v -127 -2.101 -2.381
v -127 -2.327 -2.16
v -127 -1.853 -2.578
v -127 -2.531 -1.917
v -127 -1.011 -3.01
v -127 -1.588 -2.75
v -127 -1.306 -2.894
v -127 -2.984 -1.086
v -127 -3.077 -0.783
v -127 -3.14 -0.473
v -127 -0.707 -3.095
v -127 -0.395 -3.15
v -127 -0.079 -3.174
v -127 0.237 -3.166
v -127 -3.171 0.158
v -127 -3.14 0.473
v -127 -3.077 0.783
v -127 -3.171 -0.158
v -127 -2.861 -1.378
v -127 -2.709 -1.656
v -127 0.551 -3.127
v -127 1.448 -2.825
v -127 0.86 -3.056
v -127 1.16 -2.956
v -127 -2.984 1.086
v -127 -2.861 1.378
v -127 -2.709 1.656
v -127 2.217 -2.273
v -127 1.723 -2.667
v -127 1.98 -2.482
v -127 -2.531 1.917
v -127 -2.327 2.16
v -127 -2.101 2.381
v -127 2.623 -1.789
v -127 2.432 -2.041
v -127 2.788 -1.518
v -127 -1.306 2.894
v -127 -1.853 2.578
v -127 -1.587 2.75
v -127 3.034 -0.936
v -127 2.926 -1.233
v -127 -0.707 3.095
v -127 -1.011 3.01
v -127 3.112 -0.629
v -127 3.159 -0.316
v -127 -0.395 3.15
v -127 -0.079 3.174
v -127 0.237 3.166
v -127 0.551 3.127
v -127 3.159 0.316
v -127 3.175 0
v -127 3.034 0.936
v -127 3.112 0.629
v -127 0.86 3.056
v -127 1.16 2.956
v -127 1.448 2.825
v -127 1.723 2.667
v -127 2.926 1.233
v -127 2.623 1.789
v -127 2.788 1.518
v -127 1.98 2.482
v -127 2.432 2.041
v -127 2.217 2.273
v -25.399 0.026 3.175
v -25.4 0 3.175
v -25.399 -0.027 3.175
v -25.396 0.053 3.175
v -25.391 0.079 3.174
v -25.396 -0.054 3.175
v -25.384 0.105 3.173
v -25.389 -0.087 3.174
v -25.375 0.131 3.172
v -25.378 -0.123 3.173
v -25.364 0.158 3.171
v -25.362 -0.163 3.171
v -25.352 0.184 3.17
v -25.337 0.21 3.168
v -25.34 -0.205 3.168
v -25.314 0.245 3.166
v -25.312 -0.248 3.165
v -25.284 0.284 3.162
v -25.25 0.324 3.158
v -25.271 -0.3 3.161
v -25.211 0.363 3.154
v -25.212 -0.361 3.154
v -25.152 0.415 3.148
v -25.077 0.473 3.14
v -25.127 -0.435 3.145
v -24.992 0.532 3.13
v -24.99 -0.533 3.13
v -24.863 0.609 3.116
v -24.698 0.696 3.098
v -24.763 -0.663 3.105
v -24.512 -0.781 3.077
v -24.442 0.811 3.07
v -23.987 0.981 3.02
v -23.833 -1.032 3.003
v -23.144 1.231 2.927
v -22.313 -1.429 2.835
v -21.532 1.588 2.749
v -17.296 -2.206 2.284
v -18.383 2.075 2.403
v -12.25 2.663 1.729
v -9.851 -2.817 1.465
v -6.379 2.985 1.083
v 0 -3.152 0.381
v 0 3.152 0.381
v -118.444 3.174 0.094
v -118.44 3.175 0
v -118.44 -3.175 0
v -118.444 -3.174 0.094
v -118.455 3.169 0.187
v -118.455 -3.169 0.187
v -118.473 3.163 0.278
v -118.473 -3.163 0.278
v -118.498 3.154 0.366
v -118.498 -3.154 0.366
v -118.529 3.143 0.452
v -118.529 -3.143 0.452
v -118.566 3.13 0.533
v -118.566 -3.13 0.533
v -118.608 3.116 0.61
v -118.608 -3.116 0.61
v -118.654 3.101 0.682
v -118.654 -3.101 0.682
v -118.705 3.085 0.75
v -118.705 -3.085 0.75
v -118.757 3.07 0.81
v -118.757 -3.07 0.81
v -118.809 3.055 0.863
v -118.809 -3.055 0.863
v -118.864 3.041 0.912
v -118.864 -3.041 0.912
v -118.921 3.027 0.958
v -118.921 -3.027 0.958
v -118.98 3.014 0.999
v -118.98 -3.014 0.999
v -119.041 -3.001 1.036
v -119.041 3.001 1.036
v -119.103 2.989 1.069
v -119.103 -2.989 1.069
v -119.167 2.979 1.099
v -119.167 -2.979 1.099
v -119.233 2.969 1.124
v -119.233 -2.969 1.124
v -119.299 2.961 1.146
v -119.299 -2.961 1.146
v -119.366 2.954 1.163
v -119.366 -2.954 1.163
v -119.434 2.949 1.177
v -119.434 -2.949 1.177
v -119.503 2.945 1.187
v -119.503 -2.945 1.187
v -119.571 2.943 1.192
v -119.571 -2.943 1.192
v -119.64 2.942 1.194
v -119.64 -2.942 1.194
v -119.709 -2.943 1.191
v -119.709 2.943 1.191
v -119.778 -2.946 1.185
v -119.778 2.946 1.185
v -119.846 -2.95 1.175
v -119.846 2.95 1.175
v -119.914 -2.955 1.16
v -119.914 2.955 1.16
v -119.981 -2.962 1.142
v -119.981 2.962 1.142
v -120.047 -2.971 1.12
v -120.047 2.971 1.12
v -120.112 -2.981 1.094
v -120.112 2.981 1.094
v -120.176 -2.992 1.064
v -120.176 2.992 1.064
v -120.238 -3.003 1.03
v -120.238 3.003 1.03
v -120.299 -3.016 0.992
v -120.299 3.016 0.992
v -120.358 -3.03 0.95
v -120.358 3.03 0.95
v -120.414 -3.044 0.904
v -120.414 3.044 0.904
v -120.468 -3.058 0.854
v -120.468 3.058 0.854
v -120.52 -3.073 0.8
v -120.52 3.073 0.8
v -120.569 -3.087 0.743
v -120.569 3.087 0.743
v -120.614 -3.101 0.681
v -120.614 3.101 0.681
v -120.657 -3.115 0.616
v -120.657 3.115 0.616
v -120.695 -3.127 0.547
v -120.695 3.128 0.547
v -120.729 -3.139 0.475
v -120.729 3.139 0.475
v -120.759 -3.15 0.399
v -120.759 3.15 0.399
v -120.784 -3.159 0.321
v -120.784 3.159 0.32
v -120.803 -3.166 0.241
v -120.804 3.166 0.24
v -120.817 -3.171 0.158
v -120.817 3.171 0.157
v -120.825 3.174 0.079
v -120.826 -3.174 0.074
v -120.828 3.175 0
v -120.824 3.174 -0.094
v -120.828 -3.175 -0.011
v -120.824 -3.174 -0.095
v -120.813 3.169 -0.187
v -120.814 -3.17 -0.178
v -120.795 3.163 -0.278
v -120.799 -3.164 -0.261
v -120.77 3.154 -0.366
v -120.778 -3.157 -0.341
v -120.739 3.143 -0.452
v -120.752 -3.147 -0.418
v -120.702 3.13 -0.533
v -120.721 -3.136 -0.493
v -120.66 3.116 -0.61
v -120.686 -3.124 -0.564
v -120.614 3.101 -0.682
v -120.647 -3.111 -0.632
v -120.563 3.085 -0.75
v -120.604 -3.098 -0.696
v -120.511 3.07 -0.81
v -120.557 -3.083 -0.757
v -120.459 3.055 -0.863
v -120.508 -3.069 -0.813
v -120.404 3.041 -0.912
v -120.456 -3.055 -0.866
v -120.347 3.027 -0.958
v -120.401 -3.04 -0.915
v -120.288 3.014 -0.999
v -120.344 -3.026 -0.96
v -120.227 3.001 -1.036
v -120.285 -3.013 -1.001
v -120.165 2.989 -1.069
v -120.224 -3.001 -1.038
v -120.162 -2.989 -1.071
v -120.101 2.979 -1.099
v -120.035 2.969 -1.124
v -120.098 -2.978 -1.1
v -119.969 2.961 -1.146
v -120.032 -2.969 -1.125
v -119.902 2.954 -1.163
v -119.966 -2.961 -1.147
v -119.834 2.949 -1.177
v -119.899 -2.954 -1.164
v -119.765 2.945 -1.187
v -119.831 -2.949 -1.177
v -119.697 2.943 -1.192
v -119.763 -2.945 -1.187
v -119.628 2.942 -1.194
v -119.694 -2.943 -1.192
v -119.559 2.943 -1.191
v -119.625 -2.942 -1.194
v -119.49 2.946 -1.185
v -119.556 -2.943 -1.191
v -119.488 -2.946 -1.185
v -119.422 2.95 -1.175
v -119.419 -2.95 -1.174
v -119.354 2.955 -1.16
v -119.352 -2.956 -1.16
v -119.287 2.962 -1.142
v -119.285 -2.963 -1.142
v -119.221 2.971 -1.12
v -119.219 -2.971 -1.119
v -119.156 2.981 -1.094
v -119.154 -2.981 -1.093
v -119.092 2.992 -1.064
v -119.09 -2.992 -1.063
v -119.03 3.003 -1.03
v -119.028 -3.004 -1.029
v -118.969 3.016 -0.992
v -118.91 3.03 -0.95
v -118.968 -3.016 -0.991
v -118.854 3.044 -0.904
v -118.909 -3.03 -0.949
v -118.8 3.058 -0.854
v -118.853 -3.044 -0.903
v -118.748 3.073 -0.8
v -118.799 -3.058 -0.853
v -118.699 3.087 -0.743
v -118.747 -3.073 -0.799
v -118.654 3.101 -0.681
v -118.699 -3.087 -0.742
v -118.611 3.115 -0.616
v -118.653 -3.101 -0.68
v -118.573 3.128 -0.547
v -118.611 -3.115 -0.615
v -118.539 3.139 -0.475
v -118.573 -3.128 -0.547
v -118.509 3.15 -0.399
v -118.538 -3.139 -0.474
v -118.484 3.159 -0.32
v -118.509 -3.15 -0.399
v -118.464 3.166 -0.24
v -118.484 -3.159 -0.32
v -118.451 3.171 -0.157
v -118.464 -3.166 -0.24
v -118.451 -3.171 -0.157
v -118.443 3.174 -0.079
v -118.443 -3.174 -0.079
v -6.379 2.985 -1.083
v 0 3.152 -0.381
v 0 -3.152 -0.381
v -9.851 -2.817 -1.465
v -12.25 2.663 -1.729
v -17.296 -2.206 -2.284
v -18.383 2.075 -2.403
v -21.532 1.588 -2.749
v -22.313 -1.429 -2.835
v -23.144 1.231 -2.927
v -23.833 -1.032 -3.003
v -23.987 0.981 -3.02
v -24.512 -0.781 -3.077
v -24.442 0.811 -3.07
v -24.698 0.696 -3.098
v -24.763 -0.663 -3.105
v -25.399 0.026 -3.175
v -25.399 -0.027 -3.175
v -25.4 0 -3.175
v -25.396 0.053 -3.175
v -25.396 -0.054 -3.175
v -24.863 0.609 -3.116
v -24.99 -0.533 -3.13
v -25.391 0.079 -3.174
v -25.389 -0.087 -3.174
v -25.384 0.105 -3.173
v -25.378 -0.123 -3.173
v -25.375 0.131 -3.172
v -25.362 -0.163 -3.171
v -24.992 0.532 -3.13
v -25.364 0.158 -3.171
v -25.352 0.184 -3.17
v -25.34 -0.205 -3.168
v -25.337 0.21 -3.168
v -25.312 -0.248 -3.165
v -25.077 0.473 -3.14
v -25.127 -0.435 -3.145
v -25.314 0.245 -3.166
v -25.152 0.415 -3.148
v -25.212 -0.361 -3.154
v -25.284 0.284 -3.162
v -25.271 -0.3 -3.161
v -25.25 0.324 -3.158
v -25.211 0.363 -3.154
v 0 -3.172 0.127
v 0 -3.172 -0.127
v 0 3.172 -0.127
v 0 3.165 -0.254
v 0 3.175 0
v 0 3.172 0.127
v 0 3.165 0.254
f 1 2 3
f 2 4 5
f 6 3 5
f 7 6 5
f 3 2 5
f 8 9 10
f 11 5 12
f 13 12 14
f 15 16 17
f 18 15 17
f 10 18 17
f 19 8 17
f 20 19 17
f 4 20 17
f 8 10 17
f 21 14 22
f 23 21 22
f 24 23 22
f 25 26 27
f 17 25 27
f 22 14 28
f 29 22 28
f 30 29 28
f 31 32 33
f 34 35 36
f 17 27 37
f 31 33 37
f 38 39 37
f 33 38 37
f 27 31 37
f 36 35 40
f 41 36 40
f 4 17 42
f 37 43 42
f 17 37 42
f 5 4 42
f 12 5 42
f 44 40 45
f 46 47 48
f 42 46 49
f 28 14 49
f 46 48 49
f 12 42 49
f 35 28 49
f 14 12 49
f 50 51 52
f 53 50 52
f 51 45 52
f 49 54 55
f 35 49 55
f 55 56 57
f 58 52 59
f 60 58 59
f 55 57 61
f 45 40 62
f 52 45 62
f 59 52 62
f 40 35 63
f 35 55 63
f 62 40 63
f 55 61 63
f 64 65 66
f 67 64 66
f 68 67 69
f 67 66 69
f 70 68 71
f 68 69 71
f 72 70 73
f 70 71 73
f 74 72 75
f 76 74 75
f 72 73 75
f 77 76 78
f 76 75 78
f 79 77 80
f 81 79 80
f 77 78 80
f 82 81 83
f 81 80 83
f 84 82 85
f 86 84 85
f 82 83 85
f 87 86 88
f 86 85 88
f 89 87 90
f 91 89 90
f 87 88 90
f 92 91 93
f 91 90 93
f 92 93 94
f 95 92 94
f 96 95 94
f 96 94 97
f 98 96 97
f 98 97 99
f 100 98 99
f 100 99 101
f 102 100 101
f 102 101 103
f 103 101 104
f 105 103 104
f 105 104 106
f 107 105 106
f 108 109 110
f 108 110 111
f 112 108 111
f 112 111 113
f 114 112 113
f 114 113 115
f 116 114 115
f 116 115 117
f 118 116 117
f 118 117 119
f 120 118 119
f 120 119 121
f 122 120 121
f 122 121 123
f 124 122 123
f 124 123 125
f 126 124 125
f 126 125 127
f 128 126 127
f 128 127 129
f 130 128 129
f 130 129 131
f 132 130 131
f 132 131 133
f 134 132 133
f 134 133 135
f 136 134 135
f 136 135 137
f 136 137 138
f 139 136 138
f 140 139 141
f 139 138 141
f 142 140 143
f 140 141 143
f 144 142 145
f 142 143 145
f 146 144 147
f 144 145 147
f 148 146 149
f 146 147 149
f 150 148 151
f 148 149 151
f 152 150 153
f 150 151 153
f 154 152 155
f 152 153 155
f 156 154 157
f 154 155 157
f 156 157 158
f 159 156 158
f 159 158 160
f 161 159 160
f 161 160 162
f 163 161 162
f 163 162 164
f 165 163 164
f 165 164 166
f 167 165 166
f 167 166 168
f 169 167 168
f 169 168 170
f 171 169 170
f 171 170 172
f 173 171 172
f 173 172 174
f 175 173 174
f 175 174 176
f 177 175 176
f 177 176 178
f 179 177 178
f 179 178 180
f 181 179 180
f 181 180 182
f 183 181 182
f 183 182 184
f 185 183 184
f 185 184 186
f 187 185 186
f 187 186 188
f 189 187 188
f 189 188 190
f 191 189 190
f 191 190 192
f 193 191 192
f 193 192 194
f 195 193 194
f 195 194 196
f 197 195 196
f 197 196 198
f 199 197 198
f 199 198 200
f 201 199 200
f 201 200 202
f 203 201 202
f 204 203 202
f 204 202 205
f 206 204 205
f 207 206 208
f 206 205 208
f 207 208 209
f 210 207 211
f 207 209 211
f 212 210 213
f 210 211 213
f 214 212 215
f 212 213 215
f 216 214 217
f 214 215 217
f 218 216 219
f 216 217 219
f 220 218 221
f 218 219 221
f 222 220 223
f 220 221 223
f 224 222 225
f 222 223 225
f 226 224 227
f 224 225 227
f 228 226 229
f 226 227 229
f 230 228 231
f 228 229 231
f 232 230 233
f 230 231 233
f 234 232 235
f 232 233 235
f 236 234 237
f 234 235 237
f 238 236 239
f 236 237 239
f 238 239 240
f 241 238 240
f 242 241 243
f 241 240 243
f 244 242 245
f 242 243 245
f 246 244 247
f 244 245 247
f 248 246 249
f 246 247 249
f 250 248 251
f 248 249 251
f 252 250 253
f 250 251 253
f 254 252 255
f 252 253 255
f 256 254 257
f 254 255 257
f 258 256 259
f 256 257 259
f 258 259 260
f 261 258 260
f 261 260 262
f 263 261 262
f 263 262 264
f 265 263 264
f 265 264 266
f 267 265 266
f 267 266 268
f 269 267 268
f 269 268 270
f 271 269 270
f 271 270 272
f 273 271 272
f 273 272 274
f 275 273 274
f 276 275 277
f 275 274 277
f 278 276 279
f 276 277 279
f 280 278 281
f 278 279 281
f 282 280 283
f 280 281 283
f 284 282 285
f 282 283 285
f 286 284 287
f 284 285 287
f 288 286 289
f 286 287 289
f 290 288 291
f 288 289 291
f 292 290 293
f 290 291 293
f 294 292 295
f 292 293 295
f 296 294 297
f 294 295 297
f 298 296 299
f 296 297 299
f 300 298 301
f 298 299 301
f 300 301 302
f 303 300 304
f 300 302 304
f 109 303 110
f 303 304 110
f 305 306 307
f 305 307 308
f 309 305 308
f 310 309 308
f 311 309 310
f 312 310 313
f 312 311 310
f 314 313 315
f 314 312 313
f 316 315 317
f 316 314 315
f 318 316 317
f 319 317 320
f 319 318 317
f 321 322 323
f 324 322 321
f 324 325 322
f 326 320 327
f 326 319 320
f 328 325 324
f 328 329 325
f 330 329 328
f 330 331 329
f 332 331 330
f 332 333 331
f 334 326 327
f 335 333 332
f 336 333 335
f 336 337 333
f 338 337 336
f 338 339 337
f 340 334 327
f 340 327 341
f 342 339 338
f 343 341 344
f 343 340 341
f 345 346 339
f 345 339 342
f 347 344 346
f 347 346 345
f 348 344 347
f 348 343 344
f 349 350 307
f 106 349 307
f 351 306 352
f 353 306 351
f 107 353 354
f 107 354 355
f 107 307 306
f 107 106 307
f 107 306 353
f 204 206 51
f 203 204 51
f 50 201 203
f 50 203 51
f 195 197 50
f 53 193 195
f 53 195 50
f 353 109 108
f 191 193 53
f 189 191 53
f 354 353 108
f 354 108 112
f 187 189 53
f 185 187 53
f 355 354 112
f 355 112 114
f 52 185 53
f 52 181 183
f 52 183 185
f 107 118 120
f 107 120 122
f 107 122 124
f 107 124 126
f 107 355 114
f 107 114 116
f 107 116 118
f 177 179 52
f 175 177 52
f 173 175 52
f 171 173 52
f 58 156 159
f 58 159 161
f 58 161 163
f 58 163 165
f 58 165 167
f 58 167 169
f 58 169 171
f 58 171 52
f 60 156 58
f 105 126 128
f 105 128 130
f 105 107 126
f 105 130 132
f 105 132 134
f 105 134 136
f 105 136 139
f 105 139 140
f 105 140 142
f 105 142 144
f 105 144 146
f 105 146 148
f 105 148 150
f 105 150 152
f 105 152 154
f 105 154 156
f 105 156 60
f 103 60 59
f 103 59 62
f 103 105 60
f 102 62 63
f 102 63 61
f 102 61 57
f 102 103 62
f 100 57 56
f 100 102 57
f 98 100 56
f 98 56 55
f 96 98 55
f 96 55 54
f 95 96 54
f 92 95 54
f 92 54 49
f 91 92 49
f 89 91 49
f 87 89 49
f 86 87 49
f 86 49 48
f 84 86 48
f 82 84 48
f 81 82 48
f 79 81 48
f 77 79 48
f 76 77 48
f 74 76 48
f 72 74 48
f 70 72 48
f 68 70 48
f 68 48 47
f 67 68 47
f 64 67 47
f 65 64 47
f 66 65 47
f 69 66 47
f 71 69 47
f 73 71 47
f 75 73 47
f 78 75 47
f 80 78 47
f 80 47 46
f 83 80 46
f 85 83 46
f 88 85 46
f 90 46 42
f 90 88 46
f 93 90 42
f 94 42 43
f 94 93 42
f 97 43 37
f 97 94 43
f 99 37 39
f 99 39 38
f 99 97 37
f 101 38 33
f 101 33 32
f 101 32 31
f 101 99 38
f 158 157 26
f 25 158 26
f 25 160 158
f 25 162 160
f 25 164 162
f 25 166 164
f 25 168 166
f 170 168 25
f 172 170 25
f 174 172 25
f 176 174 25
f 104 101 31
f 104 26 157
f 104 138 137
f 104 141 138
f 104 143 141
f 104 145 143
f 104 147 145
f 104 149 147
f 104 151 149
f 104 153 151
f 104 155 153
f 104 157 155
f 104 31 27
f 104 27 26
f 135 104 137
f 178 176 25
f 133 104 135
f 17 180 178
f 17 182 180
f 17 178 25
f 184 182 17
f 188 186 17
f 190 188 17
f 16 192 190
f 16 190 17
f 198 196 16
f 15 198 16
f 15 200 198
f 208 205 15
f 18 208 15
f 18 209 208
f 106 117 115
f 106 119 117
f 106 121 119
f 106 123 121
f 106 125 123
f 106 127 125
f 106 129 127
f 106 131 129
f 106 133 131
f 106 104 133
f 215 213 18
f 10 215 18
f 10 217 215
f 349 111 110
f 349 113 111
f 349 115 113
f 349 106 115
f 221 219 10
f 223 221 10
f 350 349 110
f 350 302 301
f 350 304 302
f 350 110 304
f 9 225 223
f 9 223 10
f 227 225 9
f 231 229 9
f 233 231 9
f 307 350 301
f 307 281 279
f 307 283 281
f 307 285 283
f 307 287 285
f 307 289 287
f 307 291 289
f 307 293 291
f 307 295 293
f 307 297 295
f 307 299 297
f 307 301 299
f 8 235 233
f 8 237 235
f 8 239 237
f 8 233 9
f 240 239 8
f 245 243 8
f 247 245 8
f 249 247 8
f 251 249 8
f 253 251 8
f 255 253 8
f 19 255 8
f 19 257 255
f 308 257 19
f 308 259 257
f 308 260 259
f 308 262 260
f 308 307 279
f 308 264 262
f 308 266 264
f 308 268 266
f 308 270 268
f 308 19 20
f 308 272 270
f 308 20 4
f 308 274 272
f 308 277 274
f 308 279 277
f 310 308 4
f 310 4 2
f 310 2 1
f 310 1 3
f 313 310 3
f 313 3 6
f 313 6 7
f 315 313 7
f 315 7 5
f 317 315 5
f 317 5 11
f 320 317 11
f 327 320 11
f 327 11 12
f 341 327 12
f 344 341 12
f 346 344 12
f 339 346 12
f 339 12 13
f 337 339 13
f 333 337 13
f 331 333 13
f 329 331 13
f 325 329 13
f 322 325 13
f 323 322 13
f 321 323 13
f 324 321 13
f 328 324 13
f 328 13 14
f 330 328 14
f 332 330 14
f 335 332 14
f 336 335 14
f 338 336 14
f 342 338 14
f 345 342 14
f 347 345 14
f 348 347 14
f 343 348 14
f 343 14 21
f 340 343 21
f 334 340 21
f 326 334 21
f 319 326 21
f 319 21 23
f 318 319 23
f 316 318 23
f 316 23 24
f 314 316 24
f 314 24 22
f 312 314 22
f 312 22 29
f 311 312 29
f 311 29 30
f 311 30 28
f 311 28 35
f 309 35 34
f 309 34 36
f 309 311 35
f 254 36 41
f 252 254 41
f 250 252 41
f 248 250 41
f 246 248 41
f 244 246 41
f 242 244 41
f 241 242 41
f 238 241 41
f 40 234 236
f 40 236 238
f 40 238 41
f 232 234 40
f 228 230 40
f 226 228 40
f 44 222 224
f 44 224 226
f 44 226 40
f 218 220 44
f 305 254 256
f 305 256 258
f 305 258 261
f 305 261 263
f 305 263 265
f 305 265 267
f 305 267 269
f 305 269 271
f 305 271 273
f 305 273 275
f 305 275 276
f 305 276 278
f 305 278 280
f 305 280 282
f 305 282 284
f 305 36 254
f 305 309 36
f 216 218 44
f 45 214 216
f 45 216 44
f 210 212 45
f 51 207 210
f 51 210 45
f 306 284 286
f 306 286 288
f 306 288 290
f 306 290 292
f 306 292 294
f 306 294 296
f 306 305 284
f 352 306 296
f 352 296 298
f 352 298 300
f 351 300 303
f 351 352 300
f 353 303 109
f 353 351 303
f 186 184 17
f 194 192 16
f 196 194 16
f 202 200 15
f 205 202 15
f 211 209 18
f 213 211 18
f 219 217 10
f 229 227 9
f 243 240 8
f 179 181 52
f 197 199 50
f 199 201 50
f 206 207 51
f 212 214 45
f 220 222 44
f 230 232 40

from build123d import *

# Parameters (mm, degrees)
F0_R     = 3.175
F1_DEPTH = 127
F4_DEPTH = 12.7
F2_R     = 1.1938
F5_DEPTH = 12.7


with BuildPart() as f1:
    # F0 (on Right) → F1 (new body)
    with BuildSketch(Plane.YZ):
        Circle(F0_R)
    extrude(amount=-F1_DEPTH)

    # F3 (on Front) → F4 (cut, symmetric)
    with BuildSketch(Plane.XZ):
        Polygon((0, -3.175), (0, -0.381), (-25.4, -3.175), align=None)
        Polygon((-25.4, 3.175), (0, 0.381), (0, 3.175), align=None)
    extrude(amount=F4_DEPTH, both=True, mode=Mode.SUBTRACT)

    # F2 (on Front) → F5 (cut, symmetric)
    with BuildSketch(Plane.XZ):
        with Locations((-119.634, 0)):
            Circle(F2_R)
    extrude(amount=F5_DEPTH, both=True, mode=Mode.SUBTRACT)


solid = f1.part
